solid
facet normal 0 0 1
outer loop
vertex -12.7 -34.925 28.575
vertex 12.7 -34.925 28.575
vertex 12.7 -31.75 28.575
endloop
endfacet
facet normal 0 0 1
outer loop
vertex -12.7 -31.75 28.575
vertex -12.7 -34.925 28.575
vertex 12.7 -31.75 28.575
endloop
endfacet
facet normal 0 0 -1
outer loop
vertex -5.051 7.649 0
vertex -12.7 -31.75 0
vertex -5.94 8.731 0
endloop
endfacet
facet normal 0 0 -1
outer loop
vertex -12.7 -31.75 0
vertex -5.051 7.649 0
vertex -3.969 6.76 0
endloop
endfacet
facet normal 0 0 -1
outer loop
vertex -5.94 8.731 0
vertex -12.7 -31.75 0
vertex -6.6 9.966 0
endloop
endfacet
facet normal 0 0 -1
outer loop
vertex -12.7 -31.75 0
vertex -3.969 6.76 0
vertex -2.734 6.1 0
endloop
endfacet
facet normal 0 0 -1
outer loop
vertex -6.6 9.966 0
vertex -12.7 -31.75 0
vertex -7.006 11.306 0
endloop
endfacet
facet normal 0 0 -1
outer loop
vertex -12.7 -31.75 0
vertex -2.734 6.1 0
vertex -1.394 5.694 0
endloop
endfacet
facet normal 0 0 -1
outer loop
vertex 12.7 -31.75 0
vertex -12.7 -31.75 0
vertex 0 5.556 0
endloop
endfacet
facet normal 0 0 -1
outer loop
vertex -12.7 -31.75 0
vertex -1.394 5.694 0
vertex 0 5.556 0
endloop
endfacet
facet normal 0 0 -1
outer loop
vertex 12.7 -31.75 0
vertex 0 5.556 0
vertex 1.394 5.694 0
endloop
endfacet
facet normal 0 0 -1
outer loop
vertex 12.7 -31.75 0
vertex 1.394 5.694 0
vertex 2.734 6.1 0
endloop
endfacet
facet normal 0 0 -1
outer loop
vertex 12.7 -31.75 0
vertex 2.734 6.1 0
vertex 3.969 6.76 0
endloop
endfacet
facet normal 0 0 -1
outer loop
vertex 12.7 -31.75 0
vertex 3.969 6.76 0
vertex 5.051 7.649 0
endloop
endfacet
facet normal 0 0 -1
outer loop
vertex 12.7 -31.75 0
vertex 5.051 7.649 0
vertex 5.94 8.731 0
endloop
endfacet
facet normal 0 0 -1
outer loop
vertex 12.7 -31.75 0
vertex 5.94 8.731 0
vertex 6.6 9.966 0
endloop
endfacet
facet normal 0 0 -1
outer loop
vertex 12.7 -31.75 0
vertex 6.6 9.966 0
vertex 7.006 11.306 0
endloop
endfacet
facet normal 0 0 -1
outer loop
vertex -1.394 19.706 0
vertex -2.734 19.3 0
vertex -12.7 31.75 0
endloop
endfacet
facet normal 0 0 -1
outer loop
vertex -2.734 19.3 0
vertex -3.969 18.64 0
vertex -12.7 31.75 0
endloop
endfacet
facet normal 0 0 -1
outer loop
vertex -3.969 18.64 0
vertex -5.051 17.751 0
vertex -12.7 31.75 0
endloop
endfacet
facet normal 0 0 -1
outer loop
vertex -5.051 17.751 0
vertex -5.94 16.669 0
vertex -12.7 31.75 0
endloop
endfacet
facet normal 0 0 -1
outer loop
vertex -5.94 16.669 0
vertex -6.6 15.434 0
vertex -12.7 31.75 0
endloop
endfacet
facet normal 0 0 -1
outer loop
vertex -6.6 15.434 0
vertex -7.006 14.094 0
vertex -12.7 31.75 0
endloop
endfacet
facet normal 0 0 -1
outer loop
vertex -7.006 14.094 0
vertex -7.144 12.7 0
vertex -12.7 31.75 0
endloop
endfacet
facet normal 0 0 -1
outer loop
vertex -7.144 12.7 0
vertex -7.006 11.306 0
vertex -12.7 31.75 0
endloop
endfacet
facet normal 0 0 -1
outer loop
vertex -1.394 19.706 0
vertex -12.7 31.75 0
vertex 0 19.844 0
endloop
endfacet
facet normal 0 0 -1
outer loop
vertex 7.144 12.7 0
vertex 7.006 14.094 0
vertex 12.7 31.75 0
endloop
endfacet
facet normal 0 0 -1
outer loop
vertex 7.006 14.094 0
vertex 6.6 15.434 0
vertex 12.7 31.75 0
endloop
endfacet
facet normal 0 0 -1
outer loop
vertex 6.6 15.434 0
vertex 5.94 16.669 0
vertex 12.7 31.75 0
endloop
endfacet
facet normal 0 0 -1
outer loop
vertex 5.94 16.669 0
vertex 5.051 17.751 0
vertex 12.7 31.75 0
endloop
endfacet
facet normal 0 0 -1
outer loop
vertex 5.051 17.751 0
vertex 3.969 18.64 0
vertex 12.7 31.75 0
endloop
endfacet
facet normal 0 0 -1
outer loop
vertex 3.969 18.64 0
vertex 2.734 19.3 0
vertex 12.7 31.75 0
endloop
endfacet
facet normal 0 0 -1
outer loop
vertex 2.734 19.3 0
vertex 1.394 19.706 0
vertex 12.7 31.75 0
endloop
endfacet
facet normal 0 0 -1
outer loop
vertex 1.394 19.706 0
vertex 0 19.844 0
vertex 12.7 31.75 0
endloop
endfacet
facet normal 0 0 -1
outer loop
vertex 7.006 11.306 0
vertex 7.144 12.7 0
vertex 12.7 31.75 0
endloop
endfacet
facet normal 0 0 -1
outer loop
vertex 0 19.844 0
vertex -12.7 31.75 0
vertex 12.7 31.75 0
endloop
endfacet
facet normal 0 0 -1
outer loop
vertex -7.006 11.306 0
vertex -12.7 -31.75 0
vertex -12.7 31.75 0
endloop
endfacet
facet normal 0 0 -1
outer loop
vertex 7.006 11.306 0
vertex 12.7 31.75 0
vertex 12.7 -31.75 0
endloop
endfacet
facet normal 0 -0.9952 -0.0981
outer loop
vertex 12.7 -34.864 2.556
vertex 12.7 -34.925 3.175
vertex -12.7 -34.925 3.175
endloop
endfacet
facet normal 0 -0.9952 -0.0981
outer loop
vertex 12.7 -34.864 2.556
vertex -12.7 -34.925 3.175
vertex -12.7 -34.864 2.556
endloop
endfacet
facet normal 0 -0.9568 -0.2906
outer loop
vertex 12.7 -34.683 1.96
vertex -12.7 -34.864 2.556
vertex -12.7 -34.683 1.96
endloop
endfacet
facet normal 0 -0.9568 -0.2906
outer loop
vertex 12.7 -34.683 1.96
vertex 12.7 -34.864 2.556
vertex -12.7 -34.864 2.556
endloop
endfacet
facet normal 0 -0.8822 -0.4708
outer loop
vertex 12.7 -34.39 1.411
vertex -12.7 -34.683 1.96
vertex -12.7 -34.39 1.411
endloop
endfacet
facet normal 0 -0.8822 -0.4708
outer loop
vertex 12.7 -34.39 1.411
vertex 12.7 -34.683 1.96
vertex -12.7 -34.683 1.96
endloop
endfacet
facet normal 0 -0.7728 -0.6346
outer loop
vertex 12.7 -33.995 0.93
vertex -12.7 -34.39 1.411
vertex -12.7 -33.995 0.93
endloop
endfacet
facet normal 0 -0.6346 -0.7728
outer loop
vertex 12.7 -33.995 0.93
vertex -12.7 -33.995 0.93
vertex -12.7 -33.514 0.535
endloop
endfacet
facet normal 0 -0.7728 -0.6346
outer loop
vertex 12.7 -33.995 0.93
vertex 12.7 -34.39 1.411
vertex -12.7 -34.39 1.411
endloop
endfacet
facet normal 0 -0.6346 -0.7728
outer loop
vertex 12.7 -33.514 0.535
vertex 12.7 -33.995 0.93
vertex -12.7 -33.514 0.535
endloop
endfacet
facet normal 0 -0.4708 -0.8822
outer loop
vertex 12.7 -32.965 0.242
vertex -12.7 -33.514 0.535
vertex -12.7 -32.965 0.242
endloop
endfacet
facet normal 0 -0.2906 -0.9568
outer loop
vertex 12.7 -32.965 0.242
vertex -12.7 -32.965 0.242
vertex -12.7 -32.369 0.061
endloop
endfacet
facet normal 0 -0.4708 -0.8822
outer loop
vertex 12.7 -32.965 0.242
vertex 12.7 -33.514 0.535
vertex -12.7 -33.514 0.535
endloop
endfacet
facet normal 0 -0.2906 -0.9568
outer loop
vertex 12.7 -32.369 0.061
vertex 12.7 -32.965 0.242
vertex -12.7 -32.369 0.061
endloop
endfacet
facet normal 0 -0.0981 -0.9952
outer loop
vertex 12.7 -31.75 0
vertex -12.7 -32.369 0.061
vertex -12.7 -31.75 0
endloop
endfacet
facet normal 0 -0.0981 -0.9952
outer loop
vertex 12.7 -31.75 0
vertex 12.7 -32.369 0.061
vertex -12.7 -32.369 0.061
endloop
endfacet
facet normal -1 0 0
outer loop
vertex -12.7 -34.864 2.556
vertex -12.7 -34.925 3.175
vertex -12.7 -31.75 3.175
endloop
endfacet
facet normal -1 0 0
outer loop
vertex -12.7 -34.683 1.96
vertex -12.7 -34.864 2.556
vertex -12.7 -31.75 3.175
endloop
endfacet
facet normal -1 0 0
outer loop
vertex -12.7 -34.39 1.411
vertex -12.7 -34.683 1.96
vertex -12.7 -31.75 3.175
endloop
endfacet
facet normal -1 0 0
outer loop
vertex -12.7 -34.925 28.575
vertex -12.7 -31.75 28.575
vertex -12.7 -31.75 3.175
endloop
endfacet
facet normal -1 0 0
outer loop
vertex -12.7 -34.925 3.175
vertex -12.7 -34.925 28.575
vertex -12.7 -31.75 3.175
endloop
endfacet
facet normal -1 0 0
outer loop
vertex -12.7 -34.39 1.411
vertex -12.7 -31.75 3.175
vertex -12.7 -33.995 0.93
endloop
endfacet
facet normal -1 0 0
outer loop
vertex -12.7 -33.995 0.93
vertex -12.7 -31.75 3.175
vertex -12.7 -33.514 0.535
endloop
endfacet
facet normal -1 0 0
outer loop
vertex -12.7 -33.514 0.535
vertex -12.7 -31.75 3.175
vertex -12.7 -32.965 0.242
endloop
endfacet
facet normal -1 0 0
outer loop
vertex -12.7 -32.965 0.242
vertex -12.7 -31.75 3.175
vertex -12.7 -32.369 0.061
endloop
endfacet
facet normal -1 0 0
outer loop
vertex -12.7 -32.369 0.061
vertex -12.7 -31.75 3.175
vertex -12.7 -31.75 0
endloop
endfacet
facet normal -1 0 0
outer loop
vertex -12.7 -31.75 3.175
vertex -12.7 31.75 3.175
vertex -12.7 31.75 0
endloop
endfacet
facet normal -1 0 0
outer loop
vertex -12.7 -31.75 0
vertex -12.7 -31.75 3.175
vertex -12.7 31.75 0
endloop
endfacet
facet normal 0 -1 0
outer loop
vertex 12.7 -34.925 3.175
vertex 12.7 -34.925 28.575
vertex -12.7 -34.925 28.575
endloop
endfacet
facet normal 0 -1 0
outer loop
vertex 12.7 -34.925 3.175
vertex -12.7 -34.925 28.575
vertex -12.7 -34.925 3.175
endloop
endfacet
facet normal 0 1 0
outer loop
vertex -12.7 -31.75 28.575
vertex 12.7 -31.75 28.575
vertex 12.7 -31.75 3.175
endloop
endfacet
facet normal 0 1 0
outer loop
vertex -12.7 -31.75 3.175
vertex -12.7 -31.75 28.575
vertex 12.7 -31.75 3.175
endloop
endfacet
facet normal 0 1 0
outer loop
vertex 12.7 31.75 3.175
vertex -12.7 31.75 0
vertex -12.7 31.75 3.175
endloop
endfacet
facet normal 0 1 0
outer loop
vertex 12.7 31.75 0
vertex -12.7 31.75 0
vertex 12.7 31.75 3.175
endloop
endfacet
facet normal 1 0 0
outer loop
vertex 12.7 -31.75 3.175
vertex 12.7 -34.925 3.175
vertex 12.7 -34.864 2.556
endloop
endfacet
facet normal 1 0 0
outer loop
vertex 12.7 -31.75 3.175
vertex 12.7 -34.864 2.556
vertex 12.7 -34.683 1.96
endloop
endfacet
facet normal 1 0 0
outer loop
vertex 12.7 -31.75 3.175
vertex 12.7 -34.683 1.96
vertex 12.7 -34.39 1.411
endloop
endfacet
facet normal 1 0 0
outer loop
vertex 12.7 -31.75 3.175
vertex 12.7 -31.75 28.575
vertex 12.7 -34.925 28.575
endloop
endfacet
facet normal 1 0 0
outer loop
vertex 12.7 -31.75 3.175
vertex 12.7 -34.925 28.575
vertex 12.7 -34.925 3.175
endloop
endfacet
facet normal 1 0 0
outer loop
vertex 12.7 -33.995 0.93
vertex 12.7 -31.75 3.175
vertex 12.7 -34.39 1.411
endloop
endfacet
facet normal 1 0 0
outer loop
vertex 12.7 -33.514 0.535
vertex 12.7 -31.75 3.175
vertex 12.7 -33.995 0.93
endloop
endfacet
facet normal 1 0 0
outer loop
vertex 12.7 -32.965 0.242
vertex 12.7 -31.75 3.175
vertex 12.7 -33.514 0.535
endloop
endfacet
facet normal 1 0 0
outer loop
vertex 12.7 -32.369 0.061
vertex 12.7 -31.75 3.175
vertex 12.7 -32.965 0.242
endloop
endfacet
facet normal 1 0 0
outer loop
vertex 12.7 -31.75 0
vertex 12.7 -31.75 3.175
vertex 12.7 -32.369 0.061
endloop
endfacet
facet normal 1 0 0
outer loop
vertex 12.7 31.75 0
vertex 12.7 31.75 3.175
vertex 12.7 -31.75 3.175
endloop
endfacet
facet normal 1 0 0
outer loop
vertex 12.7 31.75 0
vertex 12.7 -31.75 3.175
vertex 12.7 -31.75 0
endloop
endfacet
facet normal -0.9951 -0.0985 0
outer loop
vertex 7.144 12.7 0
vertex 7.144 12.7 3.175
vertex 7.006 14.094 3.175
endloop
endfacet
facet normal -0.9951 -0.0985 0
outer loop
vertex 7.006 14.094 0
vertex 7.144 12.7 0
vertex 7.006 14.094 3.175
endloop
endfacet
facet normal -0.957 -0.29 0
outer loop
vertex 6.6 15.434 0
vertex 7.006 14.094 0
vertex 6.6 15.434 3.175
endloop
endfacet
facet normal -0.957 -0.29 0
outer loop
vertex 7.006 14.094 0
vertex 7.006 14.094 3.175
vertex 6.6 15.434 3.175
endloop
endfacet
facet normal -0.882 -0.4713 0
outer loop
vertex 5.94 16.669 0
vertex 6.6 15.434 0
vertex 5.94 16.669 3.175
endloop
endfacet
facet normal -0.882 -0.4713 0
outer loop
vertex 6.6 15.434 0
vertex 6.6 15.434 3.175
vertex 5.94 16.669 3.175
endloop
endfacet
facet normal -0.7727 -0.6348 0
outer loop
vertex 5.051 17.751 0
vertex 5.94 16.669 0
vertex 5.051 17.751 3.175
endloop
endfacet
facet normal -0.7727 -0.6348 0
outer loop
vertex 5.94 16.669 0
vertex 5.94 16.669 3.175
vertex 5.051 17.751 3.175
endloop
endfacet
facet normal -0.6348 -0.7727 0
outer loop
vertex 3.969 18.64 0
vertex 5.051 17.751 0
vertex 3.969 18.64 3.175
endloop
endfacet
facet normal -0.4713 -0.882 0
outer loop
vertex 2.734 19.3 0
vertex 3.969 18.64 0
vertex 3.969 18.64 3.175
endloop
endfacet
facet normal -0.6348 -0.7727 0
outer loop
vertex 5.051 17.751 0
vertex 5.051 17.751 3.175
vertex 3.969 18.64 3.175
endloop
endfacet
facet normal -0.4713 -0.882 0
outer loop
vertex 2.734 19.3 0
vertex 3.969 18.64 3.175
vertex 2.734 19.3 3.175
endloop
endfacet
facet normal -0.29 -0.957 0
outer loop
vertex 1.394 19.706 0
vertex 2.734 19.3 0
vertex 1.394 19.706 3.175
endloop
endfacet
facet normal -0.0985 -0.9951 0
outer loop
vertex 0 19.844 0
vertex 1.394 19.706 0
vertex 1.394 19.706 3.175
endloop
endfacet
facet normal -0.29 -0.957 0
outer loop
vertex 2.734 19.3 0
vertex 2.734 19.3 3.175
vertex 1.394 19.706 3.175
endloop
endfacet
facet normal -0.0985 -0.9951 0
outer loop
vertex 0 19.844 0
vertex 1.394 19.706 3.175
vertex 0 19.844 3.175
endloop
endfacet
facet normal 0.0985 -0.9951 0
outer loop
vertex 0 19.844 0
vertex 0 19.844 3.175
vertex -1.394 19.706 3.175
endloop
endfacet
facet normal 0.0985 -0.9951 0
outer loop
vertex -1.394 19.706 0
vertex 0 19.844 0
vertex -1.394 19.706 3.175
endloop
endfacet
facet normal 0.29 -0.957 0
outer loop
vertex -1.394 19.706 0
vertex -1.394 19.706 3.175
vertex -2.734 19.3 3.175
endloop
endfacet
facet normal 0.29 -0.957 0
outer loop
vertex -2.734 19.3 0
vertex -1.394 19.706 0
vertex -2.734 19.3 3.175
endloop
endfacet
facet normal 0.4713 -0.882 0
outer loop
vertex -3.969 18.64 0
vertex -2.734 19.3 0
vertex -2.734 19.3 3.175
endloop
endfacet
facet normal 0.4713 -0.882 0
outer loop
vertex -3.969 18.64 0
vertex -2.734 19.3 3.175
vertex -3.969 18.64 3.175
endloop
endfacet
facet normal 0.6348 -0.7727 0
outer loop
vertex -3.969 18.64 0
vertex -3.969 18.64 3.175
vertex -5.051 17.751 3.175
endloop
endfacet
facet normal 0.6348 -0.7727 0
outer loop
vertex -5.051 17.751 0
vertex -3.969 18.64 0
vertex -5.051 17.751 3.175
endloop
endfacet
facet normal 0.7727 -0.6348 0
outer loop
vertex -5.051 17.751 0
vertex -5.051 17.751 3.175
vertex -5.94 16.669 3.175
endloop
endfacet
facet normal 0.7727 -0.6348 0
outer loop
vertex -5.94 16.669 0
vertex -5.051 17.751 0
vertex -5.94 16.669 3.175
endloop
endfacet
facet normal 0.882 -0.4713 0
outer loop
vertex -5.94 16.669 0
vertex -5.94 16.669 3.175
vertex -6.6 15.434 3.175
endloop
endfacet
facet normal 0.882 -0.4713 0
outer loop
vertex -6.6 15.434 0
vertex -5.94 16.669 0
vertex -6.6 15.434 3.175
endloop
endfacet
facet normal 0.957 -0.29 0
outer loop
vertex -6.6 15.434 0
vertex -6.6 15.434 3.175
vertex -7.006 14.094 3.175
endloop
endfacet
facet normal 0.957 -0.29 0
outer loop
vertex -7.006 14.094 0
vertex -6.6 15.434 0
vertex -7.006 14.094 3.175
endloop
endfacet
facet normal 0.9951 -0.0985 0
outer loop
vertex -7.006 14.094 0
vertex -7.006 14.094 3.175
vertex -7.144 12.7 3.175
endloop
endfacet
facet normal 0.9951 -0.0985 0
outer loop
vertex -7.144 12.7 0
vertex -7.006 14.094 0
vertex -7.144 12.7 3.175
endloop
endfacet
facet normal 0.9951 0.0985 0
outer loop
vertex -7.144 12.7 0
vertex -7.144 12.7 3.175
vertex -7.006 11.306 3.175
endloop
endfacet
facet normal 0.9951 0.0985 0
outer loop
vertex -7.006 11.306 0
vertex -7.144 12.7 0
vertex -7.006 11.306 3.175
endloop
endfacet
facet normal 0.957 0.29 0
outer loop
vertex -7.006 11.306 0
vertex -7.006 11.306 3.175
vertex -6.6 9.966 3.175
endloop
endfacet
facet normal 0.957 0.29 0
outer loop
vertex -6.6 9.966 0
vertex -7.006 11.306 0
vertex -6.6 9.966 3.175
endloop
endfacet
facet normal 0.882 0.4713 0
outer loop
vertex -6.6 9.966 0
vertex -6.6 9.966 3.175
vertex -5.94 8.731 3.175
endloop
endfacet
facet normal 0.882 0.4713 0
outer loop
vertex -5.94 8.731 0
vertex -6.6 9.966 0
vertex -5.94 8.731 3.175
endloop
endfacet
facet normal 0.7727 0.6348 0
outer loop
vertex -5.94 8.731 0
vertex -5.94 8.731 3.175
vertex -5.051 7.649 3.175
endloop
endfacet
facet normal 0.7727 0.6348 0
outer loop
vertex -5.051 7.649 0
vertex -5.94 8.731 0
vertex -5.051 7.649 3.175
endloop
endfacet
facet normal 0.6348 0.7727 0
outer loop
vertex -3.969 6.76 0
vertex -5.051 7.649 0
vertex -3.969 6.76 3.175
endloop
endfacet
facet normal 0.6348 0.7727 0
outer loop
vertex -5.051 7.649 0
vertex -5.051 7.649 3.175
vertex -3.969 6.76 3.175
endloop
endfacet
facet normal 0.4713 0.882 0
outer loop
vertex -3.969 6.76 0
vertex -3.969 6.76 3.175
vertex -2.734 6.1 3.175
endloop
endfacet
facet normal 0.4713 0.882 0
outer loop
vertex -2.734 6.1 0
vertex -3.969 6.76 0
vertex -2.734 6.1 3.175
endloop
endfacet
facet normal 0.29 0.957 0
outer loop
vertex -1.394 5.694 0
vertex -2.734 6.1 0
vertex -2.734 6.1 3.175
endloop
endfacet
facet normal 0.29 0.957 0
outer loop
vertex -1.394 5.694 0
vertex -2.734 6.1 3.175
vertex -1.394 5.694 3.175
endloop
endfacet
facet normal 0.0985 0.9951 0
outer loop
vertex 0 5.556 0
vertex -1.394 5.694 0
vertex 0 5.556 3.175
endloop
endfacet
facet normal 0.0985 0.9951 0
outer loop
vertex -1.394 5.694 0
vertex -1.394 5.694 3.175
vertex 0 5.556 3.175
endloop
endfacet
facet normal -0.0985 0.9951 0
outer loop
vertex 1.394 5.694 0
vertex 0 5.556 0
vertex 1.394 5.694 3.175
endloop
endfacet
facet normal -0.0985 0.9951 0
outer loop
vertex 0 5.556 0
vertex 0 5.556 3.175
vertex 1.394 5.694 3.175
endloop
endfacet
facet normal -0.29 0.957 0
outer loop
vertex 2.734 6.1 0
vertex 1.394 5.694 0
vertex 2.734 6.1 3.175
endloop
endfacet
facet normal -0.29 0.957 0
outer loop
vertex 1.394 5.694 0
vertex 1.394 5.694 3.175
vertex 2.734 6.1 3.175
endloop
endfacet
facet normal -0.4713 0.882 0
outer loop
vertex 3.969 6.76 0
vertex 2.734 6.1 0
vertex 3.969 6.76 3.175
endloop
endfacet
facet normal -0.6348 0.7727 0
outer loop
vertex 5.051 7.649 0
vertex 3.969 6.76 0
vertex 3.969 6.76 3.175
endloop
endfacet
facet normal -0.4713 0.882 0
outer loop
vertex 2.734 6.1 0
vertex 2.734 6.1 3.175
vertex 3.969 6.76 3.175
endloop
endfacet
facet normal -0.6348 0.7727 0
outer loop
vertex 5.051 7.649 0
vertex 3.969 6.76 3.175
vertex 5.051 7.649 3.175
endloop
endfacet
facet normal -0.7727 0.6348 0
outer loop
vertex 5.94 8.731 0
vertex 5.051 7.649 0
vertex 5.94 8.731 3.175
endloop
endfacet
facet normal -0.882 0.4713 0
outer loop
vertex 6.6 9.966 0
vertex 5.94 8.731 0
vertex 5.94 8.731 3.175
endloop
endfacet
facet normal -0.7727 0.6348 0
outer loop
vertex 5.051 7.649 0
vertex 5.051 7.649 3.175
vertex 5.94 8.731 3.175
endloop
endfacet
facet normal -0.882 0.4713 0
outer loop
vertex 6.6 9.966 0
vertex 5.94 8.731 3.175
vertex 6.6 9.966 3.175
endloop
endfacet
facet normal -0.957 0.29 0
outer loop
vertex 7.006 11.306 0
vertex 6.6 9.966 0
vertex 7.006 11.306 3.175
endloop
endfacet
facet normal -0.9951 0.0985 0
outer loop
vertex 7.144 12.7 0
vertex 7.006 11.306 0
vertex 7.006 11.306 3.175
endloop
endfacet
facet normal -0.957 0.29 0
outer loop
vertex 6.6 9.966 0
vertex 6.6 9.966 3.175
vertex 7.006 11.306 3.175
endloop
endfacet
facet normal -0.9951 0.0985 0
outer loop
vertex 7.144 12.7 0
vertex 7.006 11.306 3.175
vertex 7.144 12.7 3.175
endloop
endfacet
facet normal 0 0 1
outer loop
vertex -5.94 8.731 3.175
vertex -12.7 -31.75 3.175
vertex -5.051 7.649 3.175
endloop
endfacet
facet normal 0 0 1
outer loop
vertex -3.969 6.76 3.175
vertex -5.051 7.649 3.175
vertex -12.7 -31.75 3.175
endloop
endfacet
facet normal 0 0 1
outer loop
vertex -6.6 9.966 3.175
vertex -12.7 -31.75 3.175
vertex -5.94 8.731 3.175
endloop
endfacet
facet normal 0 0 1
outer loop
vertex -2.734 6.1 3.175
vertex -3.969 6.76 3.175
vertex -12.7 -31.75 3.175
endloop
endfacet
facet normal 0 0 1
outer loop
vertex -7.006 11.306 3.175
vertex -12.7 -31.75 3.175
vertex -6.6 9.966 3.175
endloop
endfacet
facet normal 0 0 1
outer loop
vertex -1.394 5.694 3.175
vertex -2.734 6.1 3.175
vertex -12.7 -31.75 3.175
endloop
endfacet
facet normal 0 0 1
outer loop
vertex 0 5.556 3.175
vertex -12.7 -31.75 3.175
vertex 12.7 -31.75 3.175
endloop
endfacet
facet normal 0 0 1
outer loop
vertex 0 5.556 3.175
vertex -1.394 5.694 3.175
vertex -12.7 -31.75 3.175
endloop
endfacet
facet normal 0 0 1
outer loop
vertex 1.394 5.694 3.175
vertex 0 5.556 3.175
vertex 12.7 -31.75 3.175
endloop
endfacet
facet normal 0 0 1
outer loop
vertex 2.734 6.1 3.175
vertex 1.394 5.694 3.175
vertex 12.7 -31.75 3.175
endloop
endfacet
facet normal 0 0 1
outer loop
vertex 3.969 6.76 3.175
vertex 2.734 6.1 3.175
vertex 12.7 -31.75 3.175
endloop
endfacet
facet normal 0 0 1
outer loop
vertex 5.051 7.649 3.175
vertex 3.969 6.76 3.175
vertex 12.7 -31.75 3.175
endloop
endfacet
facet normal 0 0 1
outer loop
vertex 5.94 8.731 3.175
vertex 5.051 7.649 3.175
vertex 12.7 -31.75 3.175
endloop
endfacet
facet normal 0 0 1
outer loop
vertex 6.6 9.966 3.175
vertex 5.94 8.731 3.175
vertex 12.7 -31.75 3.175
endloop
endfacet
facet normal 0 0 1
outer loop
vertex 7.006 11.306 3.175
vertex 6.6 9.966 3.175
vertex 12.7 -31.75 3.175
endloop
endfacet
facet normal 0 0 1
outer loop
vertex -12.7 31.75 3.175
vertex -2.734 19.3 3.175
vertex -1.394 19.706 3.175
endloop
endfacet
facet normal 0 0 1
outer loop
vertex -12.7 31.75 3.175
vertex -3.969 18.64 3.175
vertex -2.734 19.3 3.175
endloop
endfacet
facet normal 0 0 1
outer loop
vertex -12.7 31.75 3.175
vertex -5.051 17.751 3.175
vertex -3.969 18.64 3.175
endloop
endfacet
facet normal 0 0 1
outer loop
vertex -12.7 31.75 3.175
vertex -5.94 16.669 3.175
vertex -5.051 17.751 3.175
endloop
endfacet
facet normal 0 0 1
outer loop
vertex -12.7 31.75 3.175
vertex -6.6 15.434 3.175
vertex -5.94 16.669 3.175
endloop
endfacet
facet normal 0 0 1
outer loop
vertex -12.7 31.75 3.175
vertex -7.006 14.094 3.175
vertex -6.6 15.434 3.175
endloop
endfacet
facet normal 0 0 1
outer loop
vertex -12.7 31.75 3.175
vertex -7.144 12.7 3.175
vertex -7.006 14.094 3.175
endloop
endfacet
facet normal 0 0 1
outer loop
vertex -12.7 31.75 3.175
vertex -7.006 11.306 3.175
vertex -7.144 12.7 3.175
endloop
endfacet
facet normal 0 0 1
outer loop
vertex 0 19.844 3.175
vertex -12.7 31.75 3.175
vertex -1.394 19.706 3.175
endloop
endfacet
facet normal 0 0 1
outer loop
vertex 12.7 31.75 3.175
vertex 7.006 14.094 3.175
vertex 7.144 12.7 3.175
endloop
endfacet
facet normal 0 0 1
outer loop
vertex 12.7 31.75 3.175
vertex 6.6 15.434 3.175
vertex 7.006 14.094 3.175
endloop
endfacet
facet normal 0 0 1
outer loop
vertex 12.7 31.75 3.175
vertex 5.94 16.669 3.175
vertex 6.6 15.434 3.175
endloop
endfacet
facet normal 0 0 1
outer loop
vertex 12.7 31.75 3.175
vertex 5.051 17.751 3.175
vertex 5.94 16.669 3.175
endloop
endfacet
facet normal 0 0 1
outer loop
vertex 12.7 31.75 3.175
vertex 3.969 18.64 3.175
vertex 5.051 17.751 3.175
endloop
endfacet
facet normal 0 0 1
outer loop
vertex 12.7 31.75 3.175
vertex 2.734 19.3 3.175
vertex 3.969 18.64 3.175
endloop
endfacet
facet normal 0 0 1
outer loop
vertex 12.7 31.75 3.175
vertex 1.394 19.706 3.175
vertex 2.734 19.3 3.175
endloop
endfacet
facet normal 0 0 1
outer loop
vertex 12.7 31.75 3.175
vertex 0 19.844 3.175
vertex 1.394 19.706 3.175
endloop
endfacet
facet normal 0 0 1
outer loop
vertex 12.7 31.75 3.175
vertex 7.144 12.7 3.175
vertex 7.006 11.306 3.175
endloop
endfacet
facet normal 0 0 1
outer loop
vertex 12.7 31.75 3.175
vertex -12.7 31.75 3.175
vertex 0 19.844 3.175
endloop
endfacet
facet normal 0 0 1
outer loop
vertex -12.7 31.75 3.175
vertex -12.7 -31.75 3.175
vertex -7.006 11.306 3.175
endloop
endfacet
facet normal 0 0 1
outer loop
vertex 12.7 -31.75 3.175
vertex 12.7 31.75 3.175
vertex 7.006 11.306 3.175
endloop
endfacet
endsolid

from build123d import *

# Parameters (mm, degrees)
SKETCH1_W           = 25.4
SKETCH1_H           = 63.5
BOSS_EXTRUDE1_DEPTH = 3.175
SKETCH2_W           = 25.4
SKETCH2_H           = 3.175
BOSS_EXTRUDE2_DEPTH = 25.4
BOSS_EXTRUDE3_DEPTH = 25.4
SKETCH4_R           = 7.14375
CUT_EXTRUDE1_DEPTH  = 4.175


with BuildPart() as part:
    # Sketch1 → Boss-Extrude1 (new body)
    with BuildSketch(Plane.XY):
        Rectangle(SKETCH1_W, SKETCH1_H)
    extrude(amount=BOSS_EXTRUDE1_DEPTH)



with BuildPart() as body_2:
    # Sketch2 → Boss-Extrude2 (new body)
    with BuildSketch(Plane(origin=(12.7, 0, 0), x_dir=(0, 0, -1), z_dir=(1, 0, 0))):
        with Locations((-15.875, -33.3375)):
            Rectangle(SKETCH2_W, SKETCH2_H)
    extrude(amount=-BOSS_EXTRUDE2_DEPTH)


with BuildPart() as part_1:
    add(part.part)

    add(body_2.part)  # Boss-Extrude3 merges body 2
    # Sketch3 → Boss-Extrude3 (add)
    with BuildSketch(Plane(origin=(12.7, 0, 0), x_dir=(0, 0, -1), z_dir=(1, 0, 0))):
        with BuildLine():
            Line((0, -31.75), (-3.175, -31.75))
            Line((-3.175, -31.75), (-3.175, -34.925))
            ThreePointArc((-3.175, -34.925), (-0.92993597, -33.99506403), (0, -31.75))
        make_face()
    extrude(amount=-BOSS_EXTRUDE3_DEPTH)

    # Sketch4 → Cut-Extrude1 (cut, through all)
    with BuildSketch(Plane.XY.offset(3.175)):
        with Locations((0, 12.7)):
            Circle(SKETCH4_R)
    extrude(amount=-CUT_EXTRUDE1_DEPTH, mode=Mode.SUBTRACT)


solid = part_1.part
